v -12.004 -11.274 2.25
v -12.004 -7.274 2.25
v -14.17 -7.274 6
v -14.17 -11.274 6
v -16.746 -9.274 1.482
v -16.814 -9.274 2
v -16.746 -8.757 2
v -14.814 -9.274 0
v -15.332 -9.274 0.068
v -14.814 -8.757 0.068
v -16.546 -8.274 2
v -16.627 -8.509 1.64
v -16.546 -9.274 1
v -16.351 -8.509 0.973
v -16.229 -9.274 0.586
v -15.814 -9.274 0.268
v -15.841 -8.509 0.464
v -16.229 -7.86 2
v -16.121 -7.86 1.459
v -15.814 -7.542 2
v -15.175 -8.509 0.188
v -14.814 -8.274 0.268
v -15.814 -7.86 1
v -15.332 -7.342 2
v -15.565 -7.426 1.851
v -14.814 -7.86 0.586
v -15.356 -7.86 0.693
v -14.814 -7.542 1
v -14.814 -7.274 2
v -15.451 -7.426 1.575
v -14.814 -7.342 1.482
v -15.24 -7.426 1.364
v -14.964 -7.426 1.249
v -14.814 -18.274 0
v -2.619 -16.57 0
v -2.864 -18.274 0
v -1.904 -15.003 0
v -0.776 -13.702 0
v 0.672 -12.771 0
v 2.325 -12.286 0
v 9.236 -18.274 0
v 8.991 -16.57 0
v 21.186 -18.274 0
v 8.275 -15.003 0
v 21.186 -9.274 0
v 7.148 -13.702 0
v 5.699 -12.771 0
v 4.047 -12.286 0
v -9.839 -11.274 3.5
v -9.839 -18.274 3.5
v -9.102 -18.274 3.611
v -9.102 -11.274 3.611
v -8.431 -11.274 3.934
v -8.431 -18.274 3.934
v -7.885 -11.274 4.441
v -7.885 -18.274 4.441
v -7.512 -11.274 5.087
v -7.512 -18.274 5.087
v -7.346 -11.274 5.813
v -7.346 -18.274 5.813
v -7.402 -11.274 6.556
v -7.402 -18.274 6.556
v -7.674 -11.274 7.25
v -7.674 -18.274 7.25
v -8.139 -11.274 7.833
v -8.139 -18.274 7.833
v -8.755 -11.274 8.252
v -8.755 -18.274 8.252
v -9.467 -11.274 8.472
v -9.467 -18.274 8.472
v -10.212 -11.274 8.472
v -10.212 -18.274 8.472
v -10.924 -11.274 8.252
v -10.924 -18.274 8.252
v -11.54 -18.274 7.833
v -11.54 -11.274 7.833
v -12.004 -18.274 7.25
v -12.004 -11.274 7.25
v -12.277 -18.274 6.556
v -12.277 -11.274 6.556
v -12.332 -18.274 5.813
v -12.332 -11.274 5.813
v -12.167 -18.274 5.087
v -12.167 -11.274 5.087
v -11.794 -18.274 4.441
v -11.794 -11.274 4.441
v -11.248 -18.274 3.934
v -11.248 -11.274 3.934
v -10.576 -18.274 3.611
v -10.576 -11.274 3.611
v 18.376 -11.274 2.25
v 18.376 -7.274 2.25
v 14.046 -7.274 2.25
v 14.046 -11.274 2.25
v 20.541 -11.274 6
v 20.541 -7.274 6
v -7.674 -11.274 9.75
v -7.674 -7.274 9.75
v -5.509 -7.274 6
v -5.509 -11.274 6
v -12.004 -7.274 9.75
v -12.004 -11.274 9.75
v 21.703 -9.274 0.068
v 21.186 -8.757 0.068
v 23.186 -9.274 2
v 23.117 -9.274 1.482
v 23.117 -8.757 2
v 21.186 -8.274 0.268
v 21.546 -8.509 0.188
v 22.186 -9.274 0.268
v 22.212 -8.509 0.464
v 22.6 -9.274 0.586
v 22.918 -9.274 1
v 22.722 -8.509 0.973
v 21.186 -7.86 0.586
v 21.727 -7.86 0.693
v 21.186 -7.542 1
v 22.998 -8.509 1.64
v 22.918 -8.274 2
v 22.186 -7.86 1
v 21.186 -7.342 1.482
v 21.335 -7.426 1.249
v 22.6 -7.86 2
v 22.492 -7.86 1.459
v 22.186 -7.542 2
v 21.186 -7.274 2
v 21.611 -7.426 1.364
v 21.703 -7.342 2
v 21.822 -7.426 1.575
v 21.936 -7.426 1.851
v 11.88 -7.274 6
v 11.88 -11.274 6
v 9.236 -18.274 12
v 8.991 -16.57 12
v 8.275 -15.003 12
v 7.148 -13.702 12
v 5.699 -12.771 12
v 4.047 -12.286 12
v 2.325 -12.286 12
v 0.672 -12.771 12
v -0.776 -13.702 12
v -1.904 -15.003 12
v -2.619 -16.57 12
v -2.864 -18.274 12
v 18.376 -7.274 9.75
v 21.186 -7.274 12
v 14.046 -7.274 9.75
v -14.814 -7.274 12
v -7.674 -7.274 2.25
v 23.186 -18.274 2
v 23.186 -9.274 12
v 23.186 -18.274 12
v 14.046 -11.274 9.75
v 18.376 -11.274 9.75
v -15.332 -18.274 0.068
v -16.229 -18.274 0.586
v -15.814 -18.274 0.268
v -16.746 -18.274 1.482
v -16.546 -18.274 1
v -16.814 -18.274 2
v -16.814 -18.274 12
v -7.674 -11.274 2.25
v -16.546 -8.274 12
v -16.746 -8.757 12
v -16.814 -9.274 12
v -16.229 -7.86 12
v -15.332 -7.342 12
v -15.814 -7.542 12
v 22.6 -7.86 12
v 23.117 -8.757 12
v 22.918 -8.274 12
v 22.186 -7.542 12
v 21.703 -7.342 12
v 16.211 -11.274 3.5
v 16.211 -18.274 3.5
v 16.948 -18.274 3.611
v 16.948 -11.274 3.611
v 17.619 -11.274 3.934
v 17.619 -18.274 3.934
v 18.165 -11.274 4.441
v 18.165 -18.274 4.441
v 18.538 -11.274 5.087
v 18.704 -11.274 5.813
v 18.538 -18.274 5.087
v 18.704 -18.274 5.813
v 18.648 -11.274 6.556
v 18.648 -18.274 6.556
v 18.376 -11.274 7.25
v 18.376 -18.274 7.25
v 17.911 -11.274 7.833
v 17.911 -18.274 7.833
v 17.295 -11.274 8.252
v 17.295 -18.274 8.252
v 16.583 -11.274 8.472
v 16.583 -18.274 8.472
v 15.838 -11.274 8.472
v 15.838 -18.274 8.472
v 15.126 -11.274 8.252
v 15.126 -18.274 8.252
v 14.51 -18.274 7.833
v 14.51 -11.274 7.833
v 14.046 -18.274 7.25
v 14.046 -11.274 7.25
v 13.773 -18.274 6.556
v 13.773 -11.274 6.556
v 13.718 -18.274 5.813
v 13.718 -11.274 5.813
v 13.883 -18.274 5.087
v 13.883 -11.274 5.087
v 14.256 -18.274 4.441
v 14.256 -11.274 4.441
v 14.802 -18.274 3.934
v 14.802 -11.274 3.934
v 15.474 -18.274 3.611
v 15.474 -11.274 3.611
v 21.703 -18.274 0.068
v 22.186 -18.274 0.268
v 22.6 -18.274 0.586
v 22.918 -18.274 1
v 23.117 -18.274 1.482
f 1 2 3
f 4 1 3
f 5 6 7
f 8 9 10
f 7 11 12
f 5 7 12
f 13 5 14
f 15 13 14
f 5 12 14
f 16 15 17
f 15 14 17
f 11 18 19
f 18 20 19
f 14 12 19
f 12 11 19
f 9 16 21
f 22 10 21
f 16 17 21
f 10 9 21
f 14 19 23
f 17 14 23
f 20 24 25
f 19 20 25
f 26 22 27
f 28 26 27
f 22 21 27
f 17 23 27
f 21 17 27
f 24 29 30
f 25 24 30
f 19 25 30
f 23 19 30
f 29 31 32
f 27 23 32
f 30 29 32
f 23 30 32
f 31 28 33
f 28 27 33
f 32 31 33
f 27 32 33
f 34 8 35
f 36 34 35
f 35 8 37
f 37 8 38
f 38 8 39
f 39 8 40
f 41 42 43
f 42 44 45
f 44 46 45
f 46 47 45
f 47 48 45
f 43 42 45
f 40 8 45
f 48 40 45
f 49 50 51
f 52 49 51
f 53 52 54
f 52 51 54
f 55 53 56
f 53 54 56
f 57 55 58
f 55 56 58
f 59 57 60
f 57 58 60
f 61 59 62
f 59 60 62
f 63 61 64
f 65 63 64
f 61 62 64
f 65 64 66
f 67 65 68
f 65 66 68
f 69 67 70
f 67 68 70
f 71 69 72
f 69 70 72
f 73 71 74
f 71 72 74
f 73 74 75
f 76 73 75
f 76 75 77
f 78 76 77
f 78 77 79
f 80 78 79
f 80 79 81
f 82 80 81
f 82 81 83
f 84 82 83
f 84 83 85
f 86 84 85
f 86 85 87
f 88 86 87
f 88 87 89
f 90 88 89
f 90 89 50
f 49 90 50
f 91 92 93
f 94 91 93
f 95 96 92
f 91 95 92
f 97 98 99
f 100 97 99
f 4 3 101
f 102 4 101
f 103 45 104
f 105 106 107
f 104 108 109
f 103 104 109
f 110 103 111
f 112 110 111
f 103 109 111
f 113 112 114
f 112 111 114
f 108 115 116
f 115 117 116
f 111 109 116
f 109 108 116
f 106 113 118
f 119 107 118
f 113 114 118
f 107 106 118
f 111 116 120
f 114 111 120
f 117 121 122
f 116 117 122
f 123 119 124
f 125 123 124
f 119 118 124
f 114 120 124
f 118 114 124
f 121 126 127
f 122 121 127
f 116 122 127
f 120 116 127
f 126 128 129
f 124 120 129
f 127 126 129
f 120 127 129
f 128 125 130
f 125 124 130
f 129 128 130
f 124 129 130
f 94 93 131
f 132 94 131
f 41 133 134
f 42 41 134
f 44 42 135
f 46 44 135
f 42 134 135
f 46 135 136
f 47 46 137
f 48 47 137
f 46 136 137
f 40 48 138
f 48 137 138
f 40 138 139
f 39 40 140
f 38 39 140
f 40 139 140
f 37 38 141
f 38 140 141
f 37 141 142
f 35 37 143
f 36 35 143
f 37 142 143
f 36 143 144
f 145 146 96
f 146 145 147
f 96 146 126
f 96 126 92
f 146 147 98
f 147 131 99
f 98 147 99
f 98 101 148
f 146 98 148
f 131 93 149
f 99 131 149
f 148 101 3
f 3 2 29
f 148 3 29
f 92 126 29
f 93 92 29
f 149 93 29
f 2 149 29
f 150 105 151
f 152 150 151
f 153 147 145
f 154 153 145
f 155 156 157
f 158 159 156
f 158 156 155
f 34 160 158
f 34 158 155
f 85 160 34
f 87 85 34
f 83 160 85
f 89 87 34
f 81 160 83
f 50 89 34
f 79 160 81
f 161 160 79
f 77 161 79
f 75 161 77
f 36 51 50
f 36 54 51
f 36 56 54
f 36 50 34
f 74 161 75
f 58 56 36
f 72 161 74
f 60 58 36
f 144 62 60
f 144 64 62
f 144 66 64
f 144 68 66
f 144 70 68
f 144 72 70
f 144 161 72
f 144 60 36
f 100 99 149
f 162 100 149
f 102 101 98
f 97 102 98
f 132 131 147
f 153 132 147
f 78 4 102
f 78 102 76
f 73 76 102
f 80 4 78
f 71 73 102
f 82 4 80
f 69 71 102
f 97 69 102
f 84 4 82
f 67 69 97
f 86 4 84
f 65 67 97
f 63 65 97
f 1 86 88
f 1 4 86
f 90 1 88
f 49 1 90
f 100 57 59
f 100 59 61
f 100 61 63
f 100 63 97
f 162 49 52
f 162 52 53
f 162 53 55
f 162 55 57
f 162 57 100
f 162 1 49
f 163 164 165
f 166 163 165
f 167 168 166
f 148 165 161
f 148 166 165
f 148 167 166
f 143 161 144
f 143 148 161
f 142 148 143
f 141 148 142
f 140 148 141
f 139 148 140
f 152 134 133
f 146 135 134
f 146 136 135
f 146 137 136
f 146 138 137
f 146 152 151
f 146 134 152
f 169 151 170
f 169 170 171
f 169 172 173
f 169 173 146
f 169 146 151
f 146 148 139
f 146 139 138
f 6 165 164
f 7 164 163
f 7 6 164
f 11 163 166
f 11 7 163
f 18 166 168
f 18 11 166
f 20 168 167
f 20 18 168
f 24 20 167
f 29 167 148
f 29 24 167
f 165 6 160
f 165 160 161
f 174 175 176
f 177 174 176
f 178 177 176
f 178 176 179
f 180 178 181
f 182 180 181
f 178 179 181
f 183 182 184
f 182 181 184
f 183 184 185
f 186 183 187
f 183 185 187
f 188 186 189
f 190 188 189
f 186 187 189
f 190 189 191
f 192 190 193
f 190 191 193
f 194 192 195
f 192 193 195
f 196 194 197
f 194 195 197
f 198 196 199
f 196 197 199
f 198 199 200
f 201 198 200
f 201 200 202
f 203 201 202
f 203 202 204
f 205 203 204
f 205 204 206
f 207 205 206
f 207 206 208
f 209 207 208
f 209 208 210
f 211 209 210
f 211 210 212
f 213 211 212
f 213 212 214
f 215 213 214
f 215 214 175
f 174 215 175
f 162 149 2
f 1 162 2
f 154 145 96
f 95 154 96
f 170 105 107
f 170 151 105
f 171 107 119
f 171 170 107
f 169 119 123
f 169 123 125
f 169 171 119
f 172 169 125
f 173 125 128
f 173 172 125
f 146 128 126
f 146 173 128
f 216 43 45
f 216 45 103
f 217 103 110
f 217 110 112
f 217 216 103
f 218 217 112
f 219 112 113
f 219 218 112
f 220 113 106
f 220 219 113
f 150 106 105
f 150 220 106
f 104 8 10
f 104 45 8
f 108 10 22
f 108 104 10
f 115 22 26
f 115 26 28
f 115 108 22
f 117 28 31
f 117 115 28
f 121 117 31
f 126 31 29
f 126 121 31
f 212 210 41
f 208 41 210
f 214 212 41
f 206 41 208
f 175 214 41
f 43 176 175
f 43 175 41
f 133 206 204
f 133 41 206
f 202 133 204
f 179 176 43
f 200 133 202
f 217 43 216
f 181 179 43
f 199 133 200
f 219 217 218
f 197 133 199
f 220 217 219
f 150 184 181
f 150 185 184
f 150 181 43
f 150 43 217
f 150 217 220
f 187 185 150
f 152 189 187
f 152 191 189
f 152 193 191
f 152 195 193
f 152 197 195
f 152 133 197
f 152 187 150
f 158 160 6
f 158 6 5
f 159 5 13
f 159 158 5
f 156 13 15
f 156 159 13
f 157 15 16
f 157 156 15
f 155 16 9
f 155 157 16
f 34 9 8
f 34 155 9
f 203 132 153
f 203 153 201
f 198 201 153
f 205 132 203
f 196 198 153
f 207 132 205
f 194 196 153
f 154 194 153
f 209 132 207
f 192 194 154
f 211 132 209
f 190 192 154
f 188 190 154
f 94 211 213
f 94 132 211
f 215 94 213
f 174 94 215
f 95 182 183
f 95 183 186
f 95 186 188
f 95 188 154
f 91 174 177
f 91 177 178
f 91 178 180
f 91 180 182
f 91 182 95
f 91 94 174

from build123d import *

# Parameters (mm, degrees)
ESQUISSE1_W             = 40
ESQUISSE1_H             = 18
BOSS_EXTRU_1_DEPTH      = 12
ESQUISSE2_W             = 40
ESQUISSE2_H             = 12
BOSS_EXTRU_2_DEPTH      = 10
ENL_V_MAT_EXTRU_1_DEPTH = 12
ESQUISSE4_R             = 2.5
ENL_V_MAT_EXTRU_2_DEPTH = 28
ESQUISSE5_R             = 2.5
ENL_V_MAT_EXTRU_3_DEPTH = 12
ESQUISSE7_R             = 3.5
ENL_V_MAT_EXTRU_4_DEPTH = 4
ESQUISSE6_R             = 3.5
ENL_V_MAT_EXTRU_5_DEPTH = 12
CONG_1_R                = 2
ESQUISSE8_W             = 63.620200945
ESQUISSE8_H             = 32.659215008
ENL_V_MAT_EXTRU_6_DEPTH = 12
CONG_3_R                = 2
ENL_V_MAT_EXTRU_7_DEPTH = 4


with BuildPart() as part:
    # Esquisse1 → Boss.-Extru.1 (new body)
    with BuildSketch(Plane.XY):
        with Locations((3.185612757, 0.725848564)):
            Rectangle(ESQUISSE1_W, ESQUISSE1_H)
    extrude(amount=BOSS_EXTRU_1_DEPTH)

    # Esquisse2 → Boss.-Extru.2 (add)
    with BuildSketch(Plane.XZ.offset(8.274151436)):
        with Locations((3.185612757, 6)):
            Rectangle(ESQUISSE2_W, ESQUISSE2_H)
    extrude(amount=BOSS_EXTRU_2_DEPTH)

    # Esquisse3 → Enlèv. mat.-Extru.1 (cut)
    with BuildSketch(Plane.XY.offset(12)):
        with BuildLine():
            Line((-2.864387243, -18.274151436), (9.235612757, -18.274151436))
            ThreePointArc((9.235612757, -18.274151436), (3.185612757, -12.224151436), (-2.864387243, -18.274151436))
        make_face()
    extrude(amount=-ENL_V_MAT_EXTRU_1_DEPTH, mode=Mode.SUBTRACT)

    # Esquisse4 → Enlèv. mat.-Extru.2 (cut)
    with BuildSketch(Plane.XZ.offset(18.274151436)):
        with Locations(Location((-9.839387243, 6, 0), (0, 0, 270))):
            Circle(ESQUISSE4_R)
        with Locations(Location((16.210612757, 6, 0), (0, 0, 270))):
            Circle(ESQUISSE4_R)
    extrude(amount=-ENL_V_MAT_EXTRU_2_DEPTH, mode=Mode.SUBTRACT)

    # Esquisse5 → Enlèv. mat.-Extru.3 (cut)
    with BuildSketch(Plane.XY.offset(12)):
        with Locations((9.185612757, 0.725848564)):
            Circle(ESQUISSE5_R)
        with Locations((-2.814387243, 0.725848564)):
            Circle(ESQUISSE5_R)
    extrude(amount=-ENL_V_MAT_EXTRU_3_DEPTH, mode=Mode.SUBTRACT)

    # Esquisse7 → Enlèv. mat.-Extru.4 (cut)
    with BuildSketch(Plane(origin=(0, 0, 0), x_dir=(-1, 0, 0), z_dir=(0, 0, -1))):
        with Locations((-9.185612757, 0.725848564)):
            Circle(ESQUISSE7_R)
        with Locations((2.814387243, 0.725848564)):
            Circle(ESQUISSE7_R)
    extrude(amount=-ENL_V_MAT_EXTRU_4_DEPTH, mode=Mode.SUBTRACT)

    # Esquisse6 → Enlèv. mat.-Extru.5 (cut)
    with BuildSketch(Plane(origin=(0, 9.725848564, 0), x_dir=(1, 0, 0), z_dir=(0, 1, 0))):
        with Locations(Location((16.210612757, -6, 0), (0, 0, 270))):
            Circle(ESQUISSE6_R)
        with Locations(Location((-9.839387243, -6, 0), (0, 0, 270))):
            Circle(ESQUISSE6_R)
    extrude(amount=-ENL_V_MAT_EXTRU_5_DEPTH, mode=Mode.SUBTRACT)

    # Congé1
    cong_1_edges = [part.edges().sort_by_distance(p)[0] for p in [
        (3.185612757, 9.725848564, 0),
        (23.185612757, -4.274151436, 0),
        (-16.814387243, -4.274151436, 0),
        (-16.814387243, 9.725848564, 6),
        (23.185612757, 9.725848564, 6),
    ]]
    fillet(cong_1_edges, radius=CONG_1_R)

    # Esquisse8 → Enlèv. mat.-Extru.6 (cut)
    with BuildSketch(Plane(origin=(0, 0, 0), x_dir=(-1, 0, 0), z_dir=(0, 0, -1))):
        with Locations((-6.809355957, 9.055456068)):
            Rectangle(ESQUISSE8_W, ESQUISSE8_H)
    extrude(amount=-ENL_V_MAT_EXTRU_6_DEPTH, mode=Mode.SUBTRACT)

    # Congé3
    cong_3_edges = [part.edges().sort_by_distance(p)[0] for p in [
        (-16.228600805, -7.274151436, 0.585786438),
        (23.185612757, -7.274151436, 7),
        (-16.814387243, -7.274151436, 7),
        (22.59982632, -7.274151436, 0.585786438),
        (3.185612757, -7.274151436, 0),
    ]]
    fillet(cong_3_edges, radius=CONG_3_R)

    # Esquisse9 → Enlèv. mat.-Extru.7 (cut)
    with BuildSketch(Plane(origin=(0, -7.274151436, 0), x_dir=(1, 0, 0), z_dir=(0, 1, 0))):
        Polygon((-5.509260224, -6), (-7.674323733, -2.25), (-12.004450752, -2.25), (-14.169514261, -6), (-12.004450752, -9.75), (-7.674323733, -9.75), align=None)
        Polygon((11.880485739, -6), (14.045549248, -9.75), (18.375676267, -9.75), (20.540739776, -6), (18.375676267, -2.25), (14.045549248, -2.25), align=None)
    extrude(amount=-ENL_V_MAT_EXTRU_7_DEPTH, mode=Mode.SUBTRACT)


solid = part.part
